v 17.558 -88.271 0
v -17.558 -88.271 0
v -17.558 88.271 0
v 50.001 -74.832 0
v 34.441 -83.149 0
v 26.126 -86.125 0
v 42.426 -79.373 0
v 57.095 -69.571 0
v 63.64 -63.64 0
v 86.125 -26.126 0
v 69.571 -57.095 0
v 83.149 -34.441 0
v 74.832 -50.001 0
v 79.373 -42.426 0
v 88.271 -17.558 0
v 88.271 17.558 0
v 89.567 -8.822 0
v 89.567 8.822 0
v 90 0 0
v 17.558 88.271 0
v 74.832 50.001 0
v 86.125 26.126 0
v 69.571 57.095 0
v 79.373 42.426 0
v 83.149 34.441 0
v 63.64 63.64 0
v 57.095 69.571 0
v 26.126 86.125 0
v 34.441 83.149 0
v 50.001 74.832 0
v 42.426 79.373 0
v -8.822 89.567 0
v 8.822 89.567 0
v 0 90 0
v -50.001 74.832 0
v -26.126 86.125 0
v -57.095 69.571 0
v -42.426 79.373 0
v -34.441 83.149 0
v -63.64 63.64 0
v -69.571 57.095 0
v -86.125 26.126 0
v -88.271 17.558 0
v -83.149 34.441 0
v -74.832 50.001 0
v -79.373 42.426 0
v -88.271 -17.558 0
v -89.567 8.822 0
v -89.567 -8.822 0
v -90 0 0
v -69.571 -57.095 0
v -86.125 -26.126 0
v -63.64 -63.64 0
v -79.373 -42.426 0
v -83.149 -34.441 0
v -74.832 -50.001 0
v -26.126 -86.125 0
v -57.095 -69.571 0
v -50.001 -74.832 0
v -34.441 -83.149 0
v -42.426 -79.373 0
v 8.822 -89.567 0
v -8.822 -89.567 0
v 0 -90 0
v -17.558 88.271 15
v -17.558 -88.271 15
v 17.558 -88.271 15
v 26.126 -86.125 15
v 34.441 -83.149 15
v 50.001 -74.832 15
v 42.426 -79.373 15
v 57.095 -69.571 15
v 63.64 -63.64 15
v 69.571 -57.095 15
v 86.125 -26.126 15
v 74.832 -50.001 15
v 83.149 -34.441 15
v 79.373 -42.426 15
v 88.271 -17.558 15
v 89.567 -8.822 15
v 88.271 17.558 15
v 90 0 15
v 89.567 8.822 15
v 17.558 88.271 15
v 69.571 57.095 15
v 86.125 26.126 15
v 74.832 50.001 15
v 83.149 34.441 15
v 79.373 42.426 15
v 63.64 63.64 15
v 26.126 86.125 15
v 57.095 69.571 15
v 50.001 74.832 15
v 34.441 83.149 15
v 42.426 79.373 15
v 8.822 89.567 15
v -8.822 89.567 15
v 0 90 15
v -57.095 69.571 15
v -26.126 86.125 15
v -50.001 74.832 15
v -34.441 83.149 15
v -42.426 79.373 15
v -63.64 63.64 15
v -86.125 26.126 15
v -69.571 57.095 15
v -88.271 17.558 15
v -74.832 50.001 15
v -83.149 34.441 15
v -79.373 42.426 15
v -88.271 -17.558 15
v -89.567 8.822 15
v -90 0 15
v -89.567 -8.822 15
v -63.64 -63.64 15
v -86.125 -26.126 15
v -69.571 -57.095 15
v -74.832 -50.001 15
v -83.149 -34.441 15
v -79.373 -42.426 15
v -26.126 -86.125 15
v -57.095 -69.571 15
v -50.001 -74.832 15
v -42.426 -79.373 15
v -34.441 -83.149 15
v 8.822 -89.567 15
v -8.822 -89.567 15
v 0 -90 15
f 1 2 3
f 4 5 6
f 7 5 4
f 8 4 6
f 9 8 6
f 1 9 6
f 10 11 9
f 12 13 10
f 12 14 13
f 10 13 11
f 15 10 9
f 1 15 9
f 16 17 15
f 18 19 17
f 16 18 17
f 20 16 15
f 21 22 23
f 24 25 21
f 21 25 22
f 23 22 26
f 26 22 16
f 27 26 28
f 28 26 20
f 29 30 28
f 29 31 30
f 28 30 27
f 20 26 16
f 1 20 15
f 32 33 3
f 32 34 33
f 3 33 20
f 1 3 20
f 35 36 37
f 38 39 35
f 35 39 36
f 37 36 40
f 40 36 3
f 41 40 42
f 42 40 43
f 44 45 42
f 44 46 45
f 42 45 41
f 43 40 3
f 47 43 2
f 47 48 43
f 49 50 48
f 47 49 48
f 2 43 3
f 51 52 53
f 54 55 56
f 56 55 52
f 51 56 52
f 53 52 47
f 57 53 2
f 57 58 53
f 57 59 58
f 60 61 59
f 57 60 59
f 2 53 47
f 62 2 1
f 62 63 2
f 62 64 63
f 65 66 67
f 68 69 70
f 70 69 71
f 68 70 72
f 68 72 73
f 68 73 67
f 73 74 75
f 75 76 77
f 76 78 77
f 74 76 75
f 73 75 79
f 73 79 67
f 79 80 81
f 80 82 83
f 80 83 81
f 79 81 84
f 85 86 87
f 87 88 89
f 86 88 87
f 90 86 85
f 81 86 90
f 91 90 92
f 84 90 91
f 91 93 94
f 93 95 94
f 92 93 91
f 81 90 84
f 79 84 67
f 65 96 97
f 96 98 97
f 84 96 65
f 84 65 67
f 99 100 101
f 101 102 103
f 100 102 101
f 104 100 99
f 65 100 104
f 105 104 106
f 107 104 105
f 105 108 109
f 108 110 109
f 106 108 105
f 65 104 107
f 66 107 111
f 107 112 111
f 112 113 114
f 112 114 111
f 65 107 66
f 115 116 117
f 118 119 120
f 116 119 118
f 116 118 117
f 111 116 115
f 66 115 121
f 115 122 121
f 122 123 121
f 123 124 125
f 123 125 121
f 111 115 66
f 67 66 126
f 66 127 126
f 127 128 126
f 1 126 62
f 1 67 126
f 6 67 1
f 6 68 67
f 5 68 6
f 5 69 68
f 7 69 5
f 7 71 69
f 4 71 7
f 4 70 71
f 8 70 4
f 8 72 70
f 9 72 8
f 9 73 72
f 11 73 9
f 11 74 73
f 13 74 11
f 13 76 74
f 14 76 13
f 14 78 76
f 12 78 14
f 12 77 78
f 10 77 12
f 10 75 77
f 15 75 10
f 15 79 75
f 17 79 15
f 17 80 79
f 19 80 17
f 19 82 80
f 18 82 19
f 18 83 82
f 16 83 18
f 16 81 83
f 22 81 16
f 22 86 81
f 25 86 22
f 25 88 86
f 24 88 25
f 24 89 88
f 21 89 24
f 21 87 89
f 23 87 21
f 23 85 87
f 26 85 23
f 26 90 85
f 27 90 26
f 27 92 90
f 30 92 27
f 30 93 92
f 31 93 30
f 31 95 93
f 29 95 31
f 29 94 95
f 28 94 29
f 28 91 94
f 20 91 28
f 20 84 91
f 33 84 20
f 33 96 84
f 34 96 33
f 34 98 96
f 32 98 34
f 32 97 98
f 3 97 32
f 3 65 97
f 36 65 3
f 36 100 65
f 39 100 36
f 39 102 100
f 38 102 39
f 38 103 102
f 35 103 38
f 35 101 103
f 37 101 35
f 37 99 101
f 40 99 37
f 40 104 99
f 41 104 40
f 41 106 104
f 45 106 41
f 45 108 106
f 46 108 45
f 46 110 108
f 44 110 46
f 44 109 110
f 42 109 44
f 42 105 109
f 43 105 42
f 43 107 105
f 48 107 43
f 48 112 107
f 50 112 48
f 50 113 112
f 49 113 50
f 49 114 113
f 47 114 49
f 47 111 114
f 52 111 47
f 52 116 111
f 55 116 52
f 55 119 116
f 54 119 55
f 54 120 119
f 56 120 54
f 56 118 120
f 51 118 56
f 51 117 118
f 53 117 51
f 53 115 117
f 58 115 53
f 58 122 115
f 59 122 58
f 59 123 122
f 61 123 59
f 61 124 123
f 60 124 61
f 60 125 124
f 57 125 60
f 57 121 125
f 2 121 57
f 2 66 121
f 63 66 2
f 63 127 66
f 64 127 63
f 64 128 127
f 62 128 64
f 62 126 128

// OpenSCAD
linear_extrude(height = 15)
  union() {
    circle(r = 90, $fn = 64);
    circle(r = 30, $fn = 64);
    translate([62, 0]) circle(r = 7, $fn = 64);
    translate([43.841, 43.841]) circle(r = 7, $fn = 64);
    translate([0, 62]) circle(r = 7, $fn = 64);
    translate([-43.841, 43.841]) circle(r = 7, $fn = 64);
    translate([-62, 0]) circle(r = 7, $fn = 64);
    translate([-43.841, -43.841]) circle(r = 7, $fn = 64);
    translate([0, -62]) circle(r = 7, $fn = 64);
    translate([43.841, -43.841]) circle(r = 7, $fn = 64);
    translate([41.575, 17.221]) circle(r = 3, $fn = 64);
    translate([-17.221, 41.575]) circle(r = 3, $fn = 64);
    translate([-41.575, -17.221]) circle(r = 3, $fn = 64);
    translate([17.221, -41.575]) circle(r = 3, $fn = 64);
  }
